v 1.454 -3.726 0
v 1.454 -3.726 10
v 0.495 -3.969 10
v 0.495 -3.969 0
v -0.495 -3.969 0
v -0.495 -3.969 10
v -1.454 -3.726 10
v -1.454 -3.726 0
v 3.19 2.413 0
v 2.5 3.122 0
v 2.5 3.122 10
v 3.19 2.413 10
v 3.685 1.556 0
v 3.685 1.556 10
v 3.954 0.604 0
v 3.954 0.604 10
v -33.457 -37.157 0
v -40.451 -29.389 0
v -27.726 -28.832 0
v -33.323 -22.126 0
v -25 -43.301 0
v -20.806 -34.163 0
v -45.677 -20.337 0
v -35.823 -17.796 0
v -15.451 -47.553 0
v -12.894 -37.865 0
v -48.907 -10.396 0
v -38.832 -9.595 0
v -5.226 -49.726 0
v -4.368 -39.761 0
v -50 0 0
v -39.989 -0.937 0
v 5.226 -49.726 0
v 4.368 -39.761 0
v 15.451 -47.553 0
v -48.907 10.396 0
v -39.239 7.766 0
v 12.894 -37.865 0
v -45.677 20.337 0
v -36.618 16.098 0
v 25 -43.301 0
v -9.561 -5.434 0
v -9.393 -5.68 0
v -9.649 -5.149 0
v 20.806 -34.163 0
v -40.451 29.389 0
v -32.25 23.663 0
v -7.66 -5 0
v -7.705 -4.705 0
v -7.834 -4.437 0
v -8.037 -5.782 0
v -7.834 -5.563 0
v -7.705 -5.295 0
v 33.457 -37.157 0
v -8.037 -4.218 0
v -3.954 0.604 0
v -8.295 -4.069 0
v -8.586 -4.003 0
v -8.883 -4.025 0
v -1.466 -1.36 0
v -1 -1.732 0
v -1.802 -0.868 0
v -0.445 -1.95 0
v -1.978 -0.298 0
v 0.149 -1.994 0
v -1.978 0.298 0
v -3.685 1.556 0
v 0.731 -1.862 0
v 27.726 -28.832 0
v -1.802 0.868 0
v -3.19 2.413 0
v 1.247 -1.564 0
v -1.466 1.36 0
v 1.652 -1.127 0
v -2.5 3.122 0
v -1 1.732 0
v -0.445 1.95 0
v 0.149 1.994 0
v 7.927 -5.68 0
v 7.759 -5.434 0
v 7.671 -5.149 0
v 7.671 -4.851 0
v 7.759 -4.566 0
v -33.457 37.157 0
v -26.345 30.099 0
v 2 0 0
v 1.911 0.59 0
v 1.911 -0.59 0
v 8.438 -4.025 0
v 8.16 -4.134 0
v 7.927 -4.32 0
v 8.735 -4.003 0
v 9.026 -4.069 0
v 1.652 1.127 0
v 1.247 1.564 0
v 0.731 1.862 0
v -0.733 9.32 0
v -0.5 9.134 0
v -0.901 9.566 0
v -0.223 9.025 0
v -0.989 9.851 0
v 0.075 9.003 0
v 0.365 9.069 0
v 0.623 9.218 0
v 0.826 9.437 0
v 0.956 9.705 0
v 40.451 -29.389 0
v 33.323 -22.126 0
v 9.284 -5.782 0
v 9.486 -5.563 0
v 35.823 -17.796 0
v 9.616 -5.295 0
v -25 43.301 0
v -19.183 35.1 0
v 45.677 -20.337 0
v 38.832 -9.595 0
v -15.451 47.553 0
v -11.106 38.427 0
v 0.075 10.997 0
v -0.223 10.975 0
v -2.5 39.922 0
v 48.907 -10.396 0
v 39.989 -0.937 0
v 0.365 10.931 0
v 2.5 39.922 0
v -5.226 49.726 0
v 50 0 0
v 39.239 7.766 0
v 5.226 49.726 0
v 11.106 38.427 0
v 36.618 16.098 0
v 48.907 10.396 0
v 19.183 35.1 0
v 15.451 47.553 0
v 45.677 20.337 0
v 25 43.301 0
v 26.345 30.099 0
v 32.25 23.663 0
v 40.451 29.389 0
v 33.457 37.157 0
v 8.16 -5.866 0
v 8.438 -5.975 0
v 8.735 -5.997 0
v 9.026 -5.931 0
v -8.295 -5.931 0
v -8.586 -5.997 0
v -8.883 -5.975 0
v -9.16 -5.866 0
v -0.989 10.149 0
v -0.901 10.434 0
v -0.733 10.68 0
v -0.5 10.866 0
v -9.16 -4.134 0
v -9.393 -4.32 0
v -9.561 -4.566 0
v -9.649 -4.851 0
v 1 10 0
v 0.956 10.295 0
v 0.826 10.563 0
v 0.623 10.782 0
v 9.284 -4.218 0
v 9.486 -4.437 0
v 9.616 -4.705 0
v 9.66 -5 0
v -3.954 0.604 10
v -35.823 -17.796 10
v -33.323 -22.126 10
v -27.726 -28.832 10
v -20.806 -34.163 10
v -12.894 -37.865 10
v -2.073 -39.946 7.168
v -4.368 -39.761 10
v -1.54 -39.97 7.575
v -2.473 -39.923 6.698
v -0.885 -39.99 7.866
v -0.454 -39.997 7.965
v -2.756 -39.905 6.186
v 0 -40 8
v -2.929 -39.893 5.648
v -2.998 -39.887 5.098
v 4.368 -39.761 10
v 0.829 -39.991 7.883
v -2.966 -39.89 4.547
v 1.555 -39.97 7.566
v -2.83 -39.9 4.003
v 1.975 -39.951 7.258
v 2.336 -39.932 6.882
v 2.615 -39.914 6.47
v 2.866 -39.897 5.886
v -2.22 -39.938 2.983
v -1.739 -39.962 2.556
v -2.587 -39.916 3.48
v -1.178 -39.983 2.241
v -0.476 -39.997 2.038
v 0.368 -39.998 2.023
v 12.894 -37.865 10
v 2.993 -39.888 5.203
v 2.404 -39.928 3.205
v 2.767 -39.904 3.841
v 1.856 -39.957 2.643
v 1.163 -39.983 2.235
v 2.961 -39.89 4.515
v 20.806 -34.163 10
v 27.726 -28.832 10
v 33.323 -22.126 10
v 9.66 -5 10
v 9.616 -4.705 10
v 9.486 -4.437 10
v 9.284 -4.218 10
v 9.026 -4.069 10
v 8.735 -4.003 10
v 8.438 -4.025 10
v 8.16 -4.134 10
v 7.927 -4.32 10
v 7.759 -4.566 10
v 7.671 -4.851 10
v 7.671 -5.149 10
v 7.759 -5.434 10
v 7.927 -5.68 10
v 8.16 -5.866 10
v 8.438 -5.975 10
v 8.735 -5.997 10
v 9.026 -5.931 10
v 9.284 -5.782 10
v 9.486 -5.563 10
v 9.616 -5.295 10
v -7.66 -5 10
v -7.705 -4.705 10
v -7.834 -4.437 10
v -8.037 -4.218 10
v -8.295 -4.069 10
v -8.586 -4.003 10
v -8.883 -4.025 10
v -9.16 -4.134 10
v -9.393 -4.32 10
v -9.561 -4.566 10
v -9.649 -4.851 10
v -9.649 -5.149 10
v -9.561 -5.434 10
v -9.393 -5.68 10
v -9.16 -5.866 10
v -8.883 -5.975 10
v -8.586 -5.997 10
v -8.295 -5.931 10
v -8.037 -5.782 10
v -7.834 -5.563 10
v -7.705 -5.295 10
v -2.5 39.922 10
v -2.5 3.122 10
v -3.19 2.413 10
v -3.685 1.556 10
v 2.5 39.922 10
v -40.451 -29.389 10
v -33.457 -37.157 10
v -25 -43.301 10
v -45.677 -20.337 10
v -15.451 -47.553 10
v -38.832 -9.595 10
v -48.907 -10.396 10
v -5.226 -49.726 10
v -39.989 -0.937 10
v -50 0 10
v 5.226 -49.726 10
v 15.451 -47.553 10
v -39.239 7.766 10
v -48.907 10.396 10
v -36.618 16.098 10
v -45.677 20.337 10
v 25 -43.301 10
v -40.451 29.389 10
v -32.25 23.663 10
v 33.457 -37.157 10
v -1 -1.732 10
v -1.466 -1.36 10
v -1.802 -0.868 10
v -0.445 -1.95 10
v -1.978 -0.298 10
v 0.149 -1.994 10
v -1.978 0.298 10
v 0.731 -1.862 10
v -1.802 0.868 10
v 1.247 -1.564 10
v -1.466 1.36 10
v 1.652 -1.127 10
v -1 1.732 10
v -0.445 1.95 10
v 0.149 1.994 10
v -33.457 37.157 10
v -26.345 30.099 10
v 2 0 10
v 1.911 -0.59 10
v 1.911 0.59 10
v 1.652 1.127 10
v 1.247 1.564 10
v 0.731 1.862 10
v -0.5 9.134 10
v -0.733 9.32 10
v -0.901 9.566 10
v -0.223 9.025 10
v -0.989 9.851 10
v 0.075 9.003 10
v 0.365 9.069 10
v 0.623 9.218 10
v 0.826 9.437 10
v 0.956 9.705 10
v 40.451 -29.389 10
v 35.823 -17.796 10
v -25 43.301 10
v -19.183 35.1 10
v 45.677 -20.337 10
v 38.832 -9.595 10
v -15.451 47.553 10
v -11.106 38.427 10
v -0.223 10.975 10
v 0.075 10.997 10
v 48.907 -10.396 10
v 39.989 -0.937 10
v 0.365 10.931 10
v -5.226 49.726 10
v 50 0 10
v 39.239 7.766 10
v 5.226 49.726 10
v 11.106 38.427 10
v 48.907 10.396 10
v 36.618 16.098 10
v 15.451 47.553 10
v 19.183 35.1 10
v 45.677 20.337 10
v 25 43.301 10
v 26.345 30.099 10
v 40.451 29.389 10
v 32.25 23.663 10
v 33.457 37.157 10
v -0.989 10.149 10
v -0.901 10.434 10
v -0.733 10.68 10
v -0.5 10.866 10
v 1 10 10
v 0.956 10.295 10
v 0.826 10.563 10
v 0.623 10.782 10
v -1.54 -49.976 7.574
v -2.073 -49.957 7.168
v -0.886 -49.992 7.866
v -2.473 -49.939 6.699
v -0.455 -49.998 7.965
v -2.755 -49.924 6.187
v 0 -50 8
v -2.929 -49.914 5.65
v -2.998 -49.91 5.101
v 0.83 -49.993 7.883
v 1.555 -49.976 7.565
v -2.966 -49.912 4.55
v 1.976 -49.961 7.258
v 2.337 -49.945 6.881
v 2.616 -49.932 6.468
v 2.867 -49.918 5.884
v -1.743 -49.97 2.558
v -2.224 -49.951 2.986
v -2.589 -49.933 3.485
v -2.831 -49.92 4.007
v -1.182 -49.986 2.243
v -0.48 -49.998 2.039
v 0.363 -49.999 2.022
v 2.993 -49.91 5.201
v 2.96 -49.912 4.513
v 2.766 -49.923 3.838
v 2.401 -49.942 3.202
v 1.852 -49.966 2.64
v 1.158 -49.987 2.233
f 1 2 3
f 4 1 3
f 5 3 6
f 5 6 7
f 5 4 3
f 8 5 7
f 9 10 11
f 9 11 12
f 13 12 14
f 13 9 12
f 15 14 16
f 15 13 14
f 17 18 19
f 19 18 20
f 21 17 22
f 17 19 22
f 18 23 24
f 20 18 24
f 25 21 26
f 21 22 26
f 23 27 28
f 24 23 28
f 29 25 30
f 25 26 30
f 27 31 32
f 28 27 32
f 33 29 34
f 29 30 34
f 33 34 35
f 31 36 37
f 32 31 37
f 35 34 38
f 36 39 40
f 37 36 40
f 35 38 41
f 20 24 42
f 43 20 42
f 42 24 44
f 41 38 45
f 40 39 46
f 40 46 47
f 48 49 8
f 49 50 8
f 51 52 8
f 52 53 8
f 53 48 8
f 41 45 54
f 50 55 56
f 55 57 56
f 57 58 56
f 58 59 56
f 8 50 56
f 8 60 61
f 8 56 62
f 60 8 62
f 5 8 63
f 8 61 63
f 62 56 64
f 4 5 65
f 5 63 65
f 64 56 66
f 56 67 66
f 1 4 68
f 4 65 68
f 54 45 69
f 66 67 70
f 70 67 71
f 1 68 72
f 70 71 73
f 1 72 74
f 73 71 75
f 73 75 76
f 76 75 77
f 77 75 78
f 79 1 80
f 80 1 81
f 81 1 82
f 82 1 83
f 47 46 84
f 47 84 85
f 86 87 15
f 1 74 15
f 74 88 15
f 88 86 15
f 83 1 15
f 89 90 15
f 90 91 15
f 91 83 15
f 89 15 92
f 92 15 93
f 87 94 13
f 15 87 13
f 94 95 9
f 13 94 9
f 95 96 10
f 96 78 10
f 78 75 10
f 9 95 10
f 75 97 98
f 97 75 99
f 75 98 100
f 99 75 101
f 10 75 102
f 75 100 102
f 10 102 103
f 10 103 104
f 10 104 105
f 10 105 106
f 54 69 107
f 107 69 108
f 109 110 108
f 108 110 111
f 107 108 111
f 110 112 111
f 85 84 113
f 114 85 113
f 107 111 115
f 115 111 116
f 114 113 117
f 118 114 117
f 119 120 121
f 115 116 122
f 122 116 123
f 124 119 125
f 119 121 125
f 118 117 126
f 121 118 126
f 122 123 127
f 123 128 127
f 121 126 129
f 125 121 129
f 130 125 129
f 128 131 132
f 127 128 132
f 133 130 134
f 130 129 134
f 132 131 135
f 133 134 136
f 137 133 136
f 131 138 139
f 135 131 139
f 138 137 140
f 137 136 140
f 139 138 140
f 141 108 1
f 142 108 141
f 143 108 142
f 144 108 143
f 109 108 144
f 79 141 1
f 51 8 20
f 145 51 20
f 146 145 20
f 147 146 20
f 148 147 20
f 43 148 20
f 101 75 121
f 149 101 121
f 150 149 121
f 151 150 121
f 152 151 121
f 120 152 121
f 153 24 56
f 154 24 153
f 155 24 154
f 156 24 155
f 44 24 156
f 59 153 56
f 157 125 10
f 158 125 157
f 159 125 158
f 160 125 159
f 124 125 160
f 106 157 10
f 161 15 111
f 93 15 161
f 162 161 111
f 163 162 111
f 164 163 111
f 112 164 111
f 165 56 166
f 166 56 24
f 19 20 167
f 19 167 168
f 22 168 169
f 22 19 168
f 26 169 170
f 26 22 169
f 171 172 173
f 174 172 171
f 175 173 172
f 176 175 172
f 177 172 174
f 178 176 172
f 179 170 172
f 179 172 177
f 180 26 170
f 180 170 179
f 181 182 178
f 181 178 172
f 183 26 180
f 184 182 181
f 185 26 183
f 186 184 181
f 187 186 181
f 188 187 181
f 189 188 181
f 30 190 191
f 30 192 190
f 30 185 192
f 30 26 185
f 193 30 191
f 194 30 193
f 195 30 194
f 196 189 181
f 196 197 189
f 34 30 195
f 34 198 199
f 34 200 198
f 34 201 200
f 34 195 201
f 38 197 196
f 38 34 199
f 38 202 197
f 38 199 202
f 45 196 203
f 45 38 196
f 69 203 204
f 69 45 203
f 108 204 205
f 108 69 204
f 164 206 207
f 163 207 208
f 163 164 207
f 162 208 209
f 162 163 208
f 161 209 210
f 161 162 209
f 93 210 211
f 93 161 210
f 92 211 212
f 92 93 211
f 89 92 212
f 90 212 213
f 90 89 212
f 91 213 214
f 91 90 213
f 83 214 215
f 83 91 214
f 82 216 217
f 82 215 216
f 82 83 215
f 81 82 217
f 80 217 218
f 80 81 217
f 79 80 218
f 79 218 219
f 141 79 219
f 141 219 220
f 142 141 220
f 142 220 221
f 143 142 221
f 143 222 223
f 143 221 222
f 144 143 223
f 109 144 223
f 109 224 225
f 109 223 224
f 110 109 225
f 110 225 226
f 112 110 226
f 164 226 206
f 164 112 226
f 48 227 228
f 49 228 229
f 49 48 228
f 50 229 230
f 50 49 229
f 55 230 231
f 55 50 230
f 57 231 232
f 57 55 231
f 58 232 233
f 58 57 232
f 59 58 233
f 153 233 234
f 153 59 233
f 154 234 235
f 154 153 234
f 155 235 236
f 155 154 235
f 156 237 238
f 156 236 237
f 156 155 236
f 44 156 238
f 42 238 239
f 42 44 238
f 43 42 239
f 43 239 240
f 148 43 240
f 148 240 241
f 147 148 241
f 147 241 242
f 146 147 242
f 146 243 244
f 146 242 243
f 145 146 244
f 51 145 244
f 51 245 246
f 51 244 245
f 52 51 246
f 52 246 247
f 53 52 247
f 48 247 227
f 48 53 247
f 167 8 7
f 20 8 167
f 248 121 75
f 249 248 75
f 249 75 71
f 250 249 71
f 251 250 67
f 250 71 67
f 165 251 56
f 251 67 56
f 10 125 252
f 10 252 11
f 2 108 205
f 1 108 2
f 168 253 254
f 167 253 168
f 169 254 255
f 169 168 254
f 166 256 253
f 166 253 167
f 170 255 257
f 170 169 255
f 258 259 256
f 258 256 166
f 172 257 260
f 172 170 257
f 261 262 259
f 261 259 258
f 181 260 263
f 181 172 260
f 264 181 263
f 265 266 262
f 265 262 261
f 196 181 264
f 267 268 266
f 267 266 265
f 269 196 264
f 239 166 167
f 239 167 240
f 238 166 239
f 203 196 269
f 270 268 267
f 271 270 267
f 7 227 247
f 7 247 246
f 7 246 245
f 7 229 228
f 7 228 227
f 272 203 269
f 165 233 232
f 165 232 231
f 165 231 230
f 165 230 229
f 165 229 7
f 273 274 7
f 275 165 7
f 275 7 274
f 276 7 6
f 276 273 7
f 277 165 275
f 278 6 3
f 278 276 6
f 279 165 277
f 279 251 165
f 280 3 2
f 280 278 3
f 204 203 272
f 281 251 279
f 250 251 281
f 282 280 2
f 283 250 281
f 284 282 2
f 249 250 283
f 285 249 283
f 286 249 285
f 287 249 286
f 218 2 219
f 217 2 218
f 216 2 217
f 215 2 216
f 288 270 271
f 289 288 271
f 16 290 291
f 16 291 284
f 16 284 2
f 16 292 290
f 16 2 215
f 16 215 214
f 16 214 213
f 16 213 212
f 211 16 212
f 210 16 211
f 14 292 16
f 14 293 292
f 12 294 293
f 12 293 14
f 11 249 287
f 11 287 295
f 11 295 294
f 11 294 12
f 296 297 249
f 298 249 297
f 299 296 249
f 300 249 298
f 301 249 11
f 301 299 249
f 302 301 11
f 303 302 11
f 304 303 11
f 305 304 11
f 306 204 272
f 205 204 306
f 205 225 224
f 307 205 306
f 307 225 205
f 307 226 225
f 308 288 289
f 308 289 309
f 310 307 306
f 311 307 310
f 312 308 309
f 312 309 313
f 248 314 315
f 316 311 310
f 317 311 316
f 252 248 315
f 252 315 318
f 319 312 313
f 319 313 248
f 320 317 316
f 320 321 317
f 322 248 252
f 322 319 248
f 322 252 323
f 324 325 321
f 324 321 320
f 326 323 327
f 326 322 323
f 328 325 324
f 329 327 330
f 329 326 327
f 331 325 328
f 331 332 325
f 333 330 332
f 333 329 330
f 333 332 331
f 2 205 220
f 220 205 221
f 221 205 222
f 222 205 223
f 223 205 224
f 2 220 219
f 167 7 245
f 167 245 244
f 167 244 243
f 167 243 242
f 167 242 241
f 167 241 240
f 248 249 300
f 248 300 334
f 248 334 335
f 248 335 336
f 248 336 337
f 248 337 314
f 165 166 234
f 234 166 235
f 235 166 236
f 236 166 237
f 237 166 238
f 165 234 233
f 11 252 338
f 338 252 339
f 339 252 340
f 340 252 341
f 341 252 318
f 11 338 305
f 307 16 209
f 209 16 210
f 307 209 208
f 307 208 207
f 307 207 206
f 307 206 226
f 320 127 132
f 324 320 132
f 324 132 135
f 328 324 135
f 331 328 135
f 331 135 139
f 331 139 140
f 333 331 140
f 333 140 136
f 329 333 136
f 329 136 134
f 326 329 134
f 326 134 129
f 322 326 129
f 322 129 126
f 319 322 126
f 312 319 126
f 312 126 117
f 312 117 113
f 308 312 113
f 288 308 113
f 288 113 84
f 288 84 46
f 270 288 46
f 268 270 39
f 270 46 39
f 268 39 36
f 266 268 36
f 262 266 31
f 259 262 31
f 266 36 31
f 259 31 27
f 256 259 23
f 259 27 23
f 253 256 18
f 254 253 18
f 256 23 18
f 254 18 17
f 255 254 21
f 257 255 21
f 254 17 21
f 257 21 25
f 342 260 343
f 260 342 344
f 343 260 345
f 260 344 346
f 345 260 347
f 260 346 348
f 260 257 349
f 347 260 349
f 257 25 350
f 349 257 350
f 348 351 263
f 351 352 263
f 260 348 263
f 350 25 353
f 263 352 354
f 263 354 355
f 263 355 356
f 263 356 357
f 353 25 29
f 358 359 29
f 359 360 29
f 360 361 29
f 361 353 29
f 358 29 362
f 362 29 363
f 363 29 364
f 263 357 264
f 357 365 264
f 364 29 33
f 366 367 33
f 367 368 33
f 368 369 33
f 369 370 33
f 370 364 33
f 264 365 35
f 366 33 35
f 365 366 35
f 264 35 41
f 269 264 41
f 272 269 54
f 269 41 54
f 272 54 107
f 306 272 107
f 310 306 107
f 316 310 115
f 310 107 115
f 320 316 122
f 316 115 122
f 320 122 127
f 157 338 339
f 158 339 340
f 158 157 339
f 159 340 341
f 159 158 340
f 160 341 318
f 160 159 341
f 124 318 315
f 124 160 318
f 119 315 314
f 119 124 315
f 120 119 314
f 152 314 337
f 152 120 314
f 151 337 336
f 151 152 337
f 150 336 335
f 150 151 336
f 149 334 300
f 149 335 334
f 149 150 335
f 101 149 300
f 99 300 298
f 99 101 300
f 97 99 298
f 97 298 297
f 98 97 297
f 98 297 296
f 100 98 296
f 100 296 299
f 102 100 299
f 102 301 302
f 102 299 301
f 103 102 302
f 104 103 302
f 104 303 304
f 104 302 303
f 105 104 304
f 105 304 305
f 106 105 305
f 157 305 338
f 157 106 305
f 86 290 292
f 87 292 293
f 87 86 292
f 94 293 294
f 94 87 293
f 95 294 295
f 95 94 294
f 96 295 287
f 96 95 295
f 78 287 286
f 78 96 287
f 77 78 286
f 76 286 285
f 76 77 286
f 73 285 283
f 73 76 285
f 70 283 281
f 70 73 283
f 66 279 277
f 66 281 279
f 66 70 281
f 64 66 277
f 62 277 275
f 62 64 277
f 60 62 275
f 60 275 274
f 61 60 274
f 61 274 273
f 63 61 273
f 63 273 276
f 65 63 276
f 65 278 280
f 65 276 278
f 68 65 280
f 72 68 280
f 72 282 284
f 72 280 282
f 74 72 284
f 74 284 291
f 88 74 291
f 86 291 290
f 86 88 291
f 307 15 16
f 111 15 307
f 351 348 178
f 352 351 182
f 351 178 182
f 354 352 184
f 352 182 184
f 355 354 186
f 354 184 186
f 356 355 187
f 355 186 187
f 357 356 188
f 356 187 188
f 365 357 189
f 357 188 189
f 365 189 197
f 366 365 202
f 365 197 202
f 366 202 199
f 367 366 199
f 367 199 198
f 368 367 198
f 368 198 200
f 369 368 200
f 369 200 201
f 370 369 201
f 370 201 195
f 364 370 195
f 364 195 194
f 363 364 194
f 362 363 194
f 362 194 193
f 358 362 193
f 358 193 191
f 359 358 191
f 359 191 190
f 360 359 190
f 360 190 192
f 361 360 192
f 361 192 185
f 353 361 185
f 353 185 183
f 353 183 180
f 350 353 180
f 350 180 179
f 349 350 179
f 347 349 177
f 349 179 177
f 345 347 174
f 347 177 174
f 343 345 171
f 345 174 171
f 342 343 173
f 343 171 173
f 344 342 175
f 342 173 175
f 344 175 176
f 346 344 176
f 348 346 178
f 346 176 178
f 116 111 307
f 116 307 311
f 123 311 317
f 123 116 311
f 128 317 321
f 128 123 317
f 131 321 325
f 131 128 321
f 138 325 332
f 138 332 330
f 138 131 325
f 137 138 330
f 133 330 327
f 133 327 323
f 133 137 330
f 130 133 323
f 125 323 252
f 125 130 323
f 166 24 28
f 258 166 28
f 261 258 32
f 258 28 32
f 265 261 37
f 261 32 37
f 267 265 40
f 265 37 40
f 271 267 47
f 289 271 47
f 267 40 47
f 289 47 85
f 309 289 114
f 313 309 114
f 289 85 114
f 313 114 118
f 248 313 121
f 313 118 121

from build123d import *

# Parameters (mm, degrees)
SKETCH2_R           = 50
BOSS_EXTRUDE1_DEPTH = 10
SKETCH1_R           = 1
SKETCH1_R_2         = 2
CUT_EXTRUDE2_DEPTH  = 72.414284285
CUT_EXTRUDE3_START  = -10
SKETCH3_R           = 3
CUT_EXTRUDE3_DEPTH  = 62.414284285


with BuildPart() as part:
    # Sketch2 → Boss-Extrude1 (new body)
    with BuildSketch(Plane.XY):
        Circle(SKETCH2_R)
        with BuildLine():
            Line((2.5, 39.921798557), (2.5, 3.122498999))
            ThreePointArc((2.5, 3.122498999), (3.464101615, 2), (3.954163457, 0.60381401))
            Line((3.954163457, 0.60381401), (35.823291715, -17.795835769))
            ThreePointArc((35.823291715, -17.795835769), (34.641016151, 20), (2.5, 39.921798557))
        make_face(mode=Mode.SUBTRACT)
        with BuildLine():
            Line((-2.5, 39.921798557), (-2.5, 3.122498999))
            ThreePointArc((-2.5, 3.122498999), (-3.464101615, 2), (-3.954163457, 0.60381401))
            Line((-3.954163457, 0.60381401), (-35.823291715, -17.795835769))
            ThreePointArc((-35.823291715, -17.795835769), (-34.641016151, 20), (-2.5, 39.921798557))
        make_face(mode=Mode.SUBTRACT)
        with BuildLine():
            Line((33.323291715, -22.125962788), (1.454163457, -3.726313009))
            ThreePointArc((1.454163457, -3.726313009), (0, -4), (-1.454163457, -3.726313009))
            Line((-1.454163457, -3.726313009), (-33.323291715, -22.125962788))
            ThreePointArc((-33.323291715, -22.125962788), (0, -40), (33.323291715, -22.125962788))
        make_face(mode=Mode.SUBTRACT)
    extrude(amount=BOSS_EXTRUDE1_DEPTH)

    # Sketch1 → Cut-Extrude2 (cut, through all)
    with BuildSketch(Plane.XY):
        with Locations((0, 10)):
            Circle(SKETCH1_R)
        Circle(SKETCH1_R_2)
        with Locations((-8.660254038, -5)):
            Circle(SKETCH1_R)
        with Locations((8.660254038, -5)):
            Circle(SKETCH1_R)
    extrude(amount=CUT_EXTRUDE2_DEPTH, mode=Mode.SUBTRACT)

    # Sketch3 → Cut-Extrude3 (cut, through all)
    with BuildSketch(Plane(origin=(0, 0, 0), x_dir=(1, 0, 0), z_dir=(0, 1, 0)).offset(CUT_EXTRUDE3_START)):
        with Locations(Location((0, -5, 0), (0, 0, 270))):
            Circle(SKETCH3_R)
    extrude(amount=-CUT_EXTRUDE3_DEPTH, mode=Mode.SUBTRACT)


solid = part.part
